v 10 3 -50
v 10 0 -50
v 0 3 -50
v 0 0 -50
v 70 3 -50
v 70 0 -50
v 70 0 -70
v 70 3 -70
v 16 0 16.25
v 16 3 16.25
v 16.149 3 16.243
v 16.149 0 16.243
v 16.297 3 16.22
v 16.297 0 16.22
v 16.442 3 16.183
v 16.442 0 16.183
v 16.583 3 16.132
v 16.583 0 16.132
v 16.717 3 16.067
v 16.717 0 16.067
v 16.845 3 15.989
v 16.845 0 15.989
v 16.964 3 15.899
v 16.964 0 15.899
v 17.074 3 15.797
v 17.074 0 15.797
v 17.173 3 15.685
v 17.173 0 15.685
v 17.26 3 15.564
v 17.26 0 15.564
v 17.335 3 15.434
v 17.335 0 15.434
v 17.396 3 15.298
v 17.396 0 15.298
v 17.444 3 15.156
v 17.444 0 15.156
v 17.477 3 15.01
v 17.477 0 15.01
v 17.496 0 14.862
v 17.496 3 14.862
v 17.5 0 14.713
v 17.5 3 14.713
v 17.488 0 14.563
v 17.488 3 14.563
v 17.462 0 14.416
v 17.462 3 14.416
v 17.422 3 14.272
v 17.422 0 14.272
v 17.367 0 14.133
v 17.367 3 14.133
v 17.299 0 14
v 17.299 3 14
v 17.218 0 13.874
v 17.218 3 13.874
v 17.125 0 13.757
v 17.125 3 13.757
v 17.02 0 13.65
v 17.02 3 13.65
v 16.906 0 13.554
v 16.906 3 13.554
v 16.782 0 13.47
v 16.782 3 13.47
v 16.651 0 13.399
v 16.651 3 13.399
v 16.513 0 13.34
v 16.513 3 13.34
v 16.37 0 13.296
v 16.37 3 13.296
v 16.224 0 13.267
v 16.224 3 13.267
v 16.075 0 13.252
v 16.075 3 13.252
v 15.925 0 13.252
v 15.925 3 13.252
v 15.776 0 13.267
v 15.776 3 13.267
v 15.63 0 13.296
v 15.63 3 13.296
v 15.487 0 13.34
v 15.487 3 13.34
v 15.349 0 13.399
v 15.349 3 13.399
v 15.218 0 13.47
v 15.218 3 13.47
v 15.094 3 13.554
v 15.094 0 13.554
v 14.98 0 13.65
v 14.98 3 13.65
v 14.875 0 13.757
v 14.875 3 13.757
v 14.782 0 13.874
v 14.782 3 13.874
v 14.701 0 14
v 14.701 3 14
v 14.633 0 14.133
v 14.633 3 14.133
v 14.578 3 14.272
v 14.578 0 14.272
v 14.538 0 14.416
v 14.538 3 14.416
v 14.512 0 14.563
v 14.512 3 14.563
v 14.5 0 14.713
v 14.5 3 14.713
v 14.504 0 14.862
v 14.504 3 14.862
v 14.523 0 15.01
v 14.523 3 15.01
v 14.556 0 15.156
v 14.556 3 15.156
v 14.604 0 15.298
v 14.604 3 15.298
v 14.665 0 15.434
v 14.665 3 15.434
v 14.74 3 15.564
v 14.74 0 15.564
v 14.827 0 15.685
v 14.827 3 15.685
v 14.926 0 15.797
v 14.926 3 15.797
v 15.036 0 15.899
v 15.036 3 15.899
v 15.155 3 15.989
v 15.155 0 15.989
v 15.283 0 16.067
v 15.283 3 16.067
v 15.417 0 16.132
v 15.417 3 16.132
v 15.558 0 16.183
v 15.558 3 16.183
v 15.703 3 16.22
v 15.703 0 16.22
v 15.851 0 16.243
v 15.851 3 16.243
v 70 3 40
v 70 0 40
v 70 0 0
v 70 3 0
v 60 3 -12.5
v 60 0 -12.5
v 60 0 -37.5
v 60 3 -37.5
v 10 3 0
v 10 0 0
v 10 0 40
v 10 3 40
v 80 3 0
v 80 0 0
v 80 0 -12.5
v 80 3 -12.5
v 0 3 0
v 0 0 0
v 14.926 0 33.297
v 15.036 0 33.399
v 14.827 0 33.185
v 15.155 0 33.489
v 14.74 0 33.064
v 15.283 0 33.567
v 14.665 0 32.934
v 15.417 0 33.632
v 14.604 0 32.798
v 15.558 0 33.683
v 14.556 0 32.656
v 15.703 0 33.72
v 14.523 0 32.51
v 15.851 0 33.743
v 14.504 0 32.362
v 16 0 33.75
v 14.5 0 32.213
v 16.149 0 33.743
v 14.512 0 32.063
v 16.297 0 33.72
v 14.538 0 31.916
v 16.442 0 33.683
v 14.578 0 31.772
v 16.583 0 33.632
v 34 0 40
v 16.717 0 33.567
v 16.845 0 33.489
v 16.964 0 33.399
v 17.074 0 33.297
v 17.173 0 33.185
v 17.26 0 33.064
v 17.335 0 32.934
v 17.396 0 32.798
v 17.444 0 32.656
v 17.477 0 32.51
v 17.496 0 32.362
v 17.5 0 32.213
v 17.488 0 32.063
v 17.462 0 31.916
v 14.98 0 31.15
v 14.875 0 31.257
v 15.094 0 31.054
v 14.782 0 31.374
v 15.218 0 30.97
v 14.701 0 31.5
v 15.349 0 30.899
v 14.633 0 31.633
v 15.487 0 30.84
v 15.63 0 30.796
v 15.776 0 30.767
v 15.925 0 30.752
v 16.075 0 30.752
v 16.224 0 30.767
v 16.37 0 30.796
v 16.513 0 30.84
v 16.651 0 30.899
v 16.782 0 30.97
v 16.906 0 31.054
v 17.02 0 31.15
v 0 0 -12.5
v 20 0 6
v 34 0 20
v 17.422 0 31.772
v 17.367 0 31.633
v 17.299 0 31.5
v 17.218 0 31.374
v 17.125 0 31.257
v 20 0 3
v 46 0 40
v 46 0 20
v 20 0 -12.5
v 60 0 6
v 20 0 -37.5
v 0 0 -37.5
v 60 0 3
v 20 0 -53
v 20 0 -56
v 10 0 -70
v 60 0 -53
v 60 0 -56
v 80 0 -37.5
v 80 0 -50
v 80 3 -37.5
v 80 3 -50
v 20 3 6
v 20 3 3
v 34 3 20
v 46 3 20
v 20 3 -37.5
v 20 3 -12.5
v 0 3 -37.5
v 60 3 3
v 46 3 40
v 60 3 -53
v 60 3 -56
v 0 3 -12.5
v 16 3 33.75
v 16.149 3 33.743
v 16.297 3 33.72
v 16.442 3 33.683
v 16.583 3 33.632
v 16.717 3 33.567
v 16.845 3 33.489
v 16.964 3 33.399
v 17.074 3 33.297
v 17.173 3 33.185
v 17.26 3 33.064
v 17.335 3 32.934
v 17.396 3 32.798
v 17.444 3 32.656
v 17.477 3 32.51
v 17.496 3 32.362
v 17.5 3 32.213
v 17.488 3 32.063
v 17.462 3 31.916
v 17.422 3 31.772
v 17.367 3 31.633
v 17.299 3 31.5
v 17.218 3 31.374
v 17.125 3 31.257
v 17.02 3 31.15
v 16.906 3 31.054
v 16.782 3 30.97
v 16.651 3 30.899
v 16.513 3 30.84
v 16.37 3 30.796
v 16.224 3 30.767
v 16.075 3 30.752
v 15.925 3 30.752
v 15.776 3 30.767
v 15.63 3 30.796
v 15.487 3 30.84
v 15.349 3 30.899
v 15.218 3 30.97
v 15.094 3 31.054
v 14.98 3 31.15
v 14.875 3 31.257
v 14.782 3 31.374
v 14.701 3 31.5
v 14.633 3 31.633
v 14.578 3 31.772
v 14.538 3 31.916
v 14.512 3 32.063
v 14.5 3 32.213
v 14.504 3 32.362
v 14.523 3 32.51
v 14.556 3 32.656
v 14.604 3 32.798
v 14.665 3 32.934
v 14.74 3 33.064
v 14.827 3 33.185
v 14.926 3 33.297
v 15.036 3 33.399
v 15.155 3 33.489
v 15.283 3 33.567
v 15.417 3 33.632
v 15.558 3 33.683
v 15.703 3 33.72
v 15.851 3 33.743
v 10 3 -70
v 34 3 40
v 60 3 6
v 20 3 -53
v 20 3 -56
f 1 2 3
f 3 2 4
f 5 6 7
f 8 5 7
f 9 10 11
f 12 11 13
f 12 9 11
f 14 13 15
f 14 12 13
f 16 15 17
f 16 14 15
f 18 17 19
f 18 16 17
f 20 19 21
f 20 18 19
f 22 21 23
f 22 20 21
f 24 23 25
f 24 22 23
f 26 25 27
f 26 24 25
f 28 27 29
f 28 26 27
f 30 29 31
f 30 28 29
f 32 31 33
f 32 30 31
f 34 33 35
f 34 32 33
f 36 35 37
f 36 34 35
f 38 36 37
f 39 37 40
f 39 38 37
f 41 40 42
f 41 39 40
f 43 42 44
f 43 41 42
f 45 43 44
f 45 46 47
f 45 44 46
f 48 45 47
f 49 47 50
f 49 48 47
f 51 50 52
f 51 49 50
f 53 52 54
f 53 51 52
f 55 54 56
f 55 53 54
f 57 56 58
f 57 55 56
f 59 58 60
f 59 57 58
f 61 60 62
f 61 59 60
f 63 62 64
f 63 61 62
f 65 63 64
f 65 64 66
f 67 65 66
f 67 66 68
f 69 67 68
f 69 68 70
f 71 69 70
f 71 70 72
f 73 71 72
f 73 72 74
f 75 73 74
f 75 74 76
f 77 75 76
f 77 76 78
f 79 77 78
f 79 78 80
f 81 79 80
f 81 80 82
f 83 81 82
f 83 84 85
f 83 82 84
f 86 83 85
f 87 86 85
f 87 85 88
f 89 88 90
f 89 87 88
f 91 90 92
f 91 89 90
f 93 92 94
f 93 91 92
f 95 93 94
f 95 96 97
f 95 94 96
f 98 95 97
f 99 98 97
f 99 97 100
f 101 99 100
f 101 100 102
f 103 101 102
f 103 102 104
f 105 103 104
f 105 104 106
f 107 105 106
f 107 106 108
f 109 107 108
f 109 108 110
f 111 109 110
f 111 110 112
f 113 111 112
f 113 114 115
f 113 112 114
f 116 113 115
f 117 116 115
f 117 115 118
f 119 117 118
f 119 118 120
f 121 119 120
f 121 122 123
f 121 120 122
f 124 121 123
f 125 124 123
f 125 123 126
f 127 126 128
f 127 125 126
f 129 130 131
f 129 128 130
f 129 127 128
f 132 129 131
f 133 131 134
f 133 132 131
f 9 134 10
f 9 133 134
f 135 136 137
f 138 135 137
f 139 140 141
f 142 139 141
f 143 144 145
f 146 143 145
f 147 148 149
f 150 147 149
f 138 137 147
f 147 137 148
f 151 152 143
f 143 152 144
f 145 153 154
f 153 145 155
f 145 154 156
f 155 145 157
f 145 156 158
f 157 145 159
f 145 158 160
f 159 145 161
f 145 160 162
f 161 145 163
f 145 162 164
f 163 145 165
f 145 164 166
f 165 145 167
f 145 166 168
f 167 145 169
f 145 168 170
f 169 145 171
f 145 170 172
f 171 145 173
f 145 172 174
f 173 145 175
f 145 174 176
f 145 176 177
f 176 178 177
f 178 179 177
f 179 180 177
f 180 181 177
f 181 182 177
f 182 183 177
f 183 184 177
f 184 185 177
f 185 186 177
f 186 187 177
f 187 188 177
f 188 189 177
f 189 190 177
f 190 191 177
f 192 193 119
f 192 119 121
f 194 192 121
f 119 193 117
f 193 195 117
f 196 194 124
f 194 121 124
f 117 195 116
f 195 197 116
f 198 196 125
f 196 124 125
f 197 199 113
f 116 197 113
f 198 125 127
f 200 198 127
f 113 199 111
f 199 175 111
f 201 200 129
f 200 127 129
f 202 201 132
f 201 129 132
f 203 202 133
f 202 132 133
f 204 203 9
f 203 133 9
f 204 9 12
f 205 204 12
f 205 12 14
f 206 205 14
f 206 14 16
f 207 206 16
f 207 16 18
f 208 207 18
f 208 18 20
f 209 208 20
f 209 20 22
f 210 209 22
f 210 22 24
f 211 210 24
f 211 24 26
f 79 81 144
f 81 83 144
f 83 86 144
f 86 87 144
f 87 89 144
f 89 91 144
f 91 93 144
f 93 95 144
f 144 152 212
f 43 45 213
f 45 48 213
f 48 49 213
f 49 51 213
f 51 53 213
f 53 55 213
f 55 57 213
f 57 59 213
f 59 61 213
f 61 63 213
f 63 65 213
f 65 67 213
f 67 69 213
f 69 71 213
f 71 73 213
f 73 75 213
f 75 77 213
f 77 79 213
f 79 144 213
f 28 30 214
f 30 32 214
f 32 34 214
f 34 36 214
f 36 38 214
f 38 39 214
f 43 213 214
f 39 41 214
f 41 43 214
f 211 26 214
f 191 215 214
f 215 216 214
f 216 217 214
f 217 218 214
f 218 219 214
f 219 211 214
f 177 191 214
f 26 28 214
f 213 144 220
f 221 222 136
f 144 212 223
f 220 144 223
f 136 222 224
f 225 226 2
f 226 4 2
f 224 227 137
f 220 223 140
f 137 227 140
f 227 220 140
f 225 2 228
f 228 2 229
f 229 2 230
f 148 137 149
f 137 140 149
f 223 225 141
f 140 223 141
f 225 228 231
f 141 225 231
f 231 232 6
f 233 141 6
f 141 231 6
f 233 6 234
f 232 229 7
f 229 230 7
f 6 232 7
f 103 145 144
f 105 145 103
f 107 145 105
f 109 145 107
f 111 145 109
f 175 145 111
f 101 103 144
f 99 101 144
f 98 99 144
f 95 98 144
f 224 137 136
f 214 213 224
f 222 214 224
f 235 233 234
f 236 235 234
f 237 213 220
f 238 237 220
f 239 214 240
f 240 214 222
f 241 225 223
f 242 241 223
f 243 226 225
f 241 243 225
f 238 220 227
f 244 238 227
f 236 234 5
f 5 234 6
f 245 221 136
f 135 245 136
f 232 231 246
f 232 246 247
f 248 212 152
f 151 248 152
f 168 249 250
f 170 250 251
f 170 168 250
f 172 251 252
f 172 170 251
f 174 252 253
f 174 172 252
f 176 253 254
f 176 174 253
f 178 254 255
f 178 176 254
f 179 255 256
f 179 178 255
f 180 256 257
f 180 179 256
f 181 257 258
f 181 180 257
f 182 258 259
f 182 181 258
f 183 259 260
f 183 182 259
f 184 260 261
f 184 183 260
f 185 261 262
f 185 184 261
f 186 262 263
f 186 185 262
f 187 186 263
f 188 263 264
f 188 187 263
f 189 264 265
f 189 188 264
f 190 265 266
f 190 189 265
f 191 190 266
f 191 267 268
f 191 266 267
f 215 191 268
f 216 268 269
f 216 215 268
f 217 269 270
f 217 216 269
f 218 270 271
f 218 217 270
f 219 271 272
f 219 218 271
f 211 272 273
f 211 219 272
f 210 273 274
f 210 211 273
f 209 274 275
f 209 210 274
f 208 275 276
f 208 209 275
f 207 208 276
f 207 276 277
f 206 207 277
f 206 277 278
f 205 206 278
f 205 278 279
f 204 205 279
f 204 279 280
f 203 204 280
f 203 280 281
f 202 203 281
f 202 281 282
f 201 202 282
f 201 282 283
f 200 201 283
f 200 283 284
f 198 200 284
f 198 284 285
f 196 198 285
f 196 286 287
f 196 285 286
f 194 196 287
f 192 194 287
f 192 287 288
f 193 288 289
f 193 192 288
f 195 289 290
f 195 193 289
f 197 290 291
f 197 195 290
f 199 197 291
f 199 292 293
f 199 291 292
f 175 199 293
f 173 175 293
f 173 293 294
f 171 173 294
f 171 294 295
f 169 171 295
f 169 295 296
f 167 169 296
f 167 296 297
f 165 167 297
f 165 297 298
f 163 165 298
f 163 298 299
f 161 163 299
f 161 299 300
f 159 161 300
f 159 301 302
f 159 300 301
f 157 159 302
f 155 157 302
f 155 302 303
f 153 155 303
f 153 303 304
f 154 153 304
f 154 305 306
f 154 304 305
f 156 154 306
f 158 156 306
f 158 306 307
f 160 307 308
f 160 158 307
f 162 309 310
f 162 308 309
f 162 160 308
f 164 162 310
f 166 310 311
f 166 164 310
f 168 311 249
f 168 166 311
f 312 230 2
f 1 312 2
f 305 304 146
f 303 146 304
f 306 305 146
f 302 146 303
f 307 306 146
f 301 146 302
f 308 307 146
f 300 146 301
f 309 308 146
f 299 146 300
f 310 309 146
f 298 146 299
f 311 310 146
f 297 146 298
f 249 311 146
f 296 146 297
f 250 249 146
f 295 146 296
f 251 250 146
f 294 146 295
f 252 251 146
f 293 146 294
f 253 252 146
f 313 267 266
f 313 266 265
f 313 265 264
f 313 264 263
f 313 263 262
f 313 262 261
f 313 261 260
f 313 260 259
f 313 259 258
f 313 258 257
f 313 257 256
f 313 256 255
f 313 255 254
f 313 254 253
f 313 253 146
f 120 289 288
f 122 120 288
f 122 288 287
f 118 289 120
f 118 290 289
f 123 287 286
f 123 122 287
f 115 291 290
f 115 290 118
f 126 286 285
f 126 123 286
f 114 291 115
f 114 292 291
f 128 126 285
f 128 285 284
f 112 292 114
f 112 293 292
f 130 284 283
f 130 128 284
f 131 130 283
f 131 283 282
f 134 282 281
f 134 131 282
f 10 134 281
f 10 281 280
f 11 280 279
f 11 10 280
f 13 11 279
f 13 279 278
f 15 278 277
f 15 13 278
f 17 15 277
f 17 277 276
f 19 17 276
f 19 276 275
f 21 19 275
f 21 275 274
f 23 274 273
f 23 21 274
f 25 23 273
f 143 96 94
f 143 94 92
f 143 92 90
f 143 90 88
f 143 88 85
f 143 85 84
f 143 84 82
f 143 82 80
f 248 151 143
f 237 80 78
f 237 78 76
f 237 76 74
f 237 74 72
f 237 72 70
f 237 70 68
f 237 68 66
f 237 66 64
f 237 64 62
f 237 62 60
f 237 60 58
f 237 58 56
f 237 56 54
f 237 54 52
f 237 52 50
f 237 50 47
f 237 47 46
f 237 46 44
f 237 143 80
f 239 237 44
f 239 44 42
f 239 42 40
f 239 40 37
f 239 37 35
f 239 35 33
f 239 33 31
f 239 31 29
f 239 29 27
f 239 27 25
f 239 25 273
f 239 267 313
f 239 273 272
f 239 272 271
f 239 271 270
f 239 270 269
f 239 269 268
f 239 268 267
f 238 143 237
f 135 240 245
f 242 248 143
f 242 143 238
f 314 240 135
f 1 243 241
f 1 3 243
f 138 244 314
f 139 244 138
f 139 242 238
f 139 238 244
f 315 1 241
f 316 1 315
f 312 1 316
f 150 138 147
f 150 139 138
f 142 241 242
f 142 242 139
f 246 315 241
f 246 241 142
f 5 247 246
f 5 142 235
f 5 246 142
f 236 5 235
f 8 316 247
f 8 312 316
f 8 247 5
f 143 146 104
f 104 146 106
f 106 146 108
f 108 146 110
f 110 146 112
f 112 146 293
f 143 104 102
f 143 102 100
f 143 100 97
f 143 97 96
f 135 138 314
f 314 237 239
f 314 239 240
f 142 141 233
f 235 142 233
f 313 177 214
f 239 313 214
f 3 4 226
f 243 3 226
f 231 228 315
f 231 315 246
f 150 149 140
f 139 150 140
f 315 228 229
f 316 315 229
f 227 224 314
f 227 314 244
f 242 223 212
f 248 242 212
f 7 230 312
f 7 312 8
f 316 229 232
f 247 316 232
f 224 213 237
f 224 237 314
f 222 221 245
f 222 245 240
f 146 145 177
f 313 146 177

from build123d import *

# Parameters (mm, degrees)
SKETCH1_W           = 40
SKETCH1_H           = 3
BOSS_EXTRUDE1_DEPTH = 3
SKETCH3_R           = 1.5
SKETCH3_W           = 12
SKETCH3_H           = 20
SKETCH3_W_2         = 60
CUT_EXTRUDE2_DEPTH  = 10


with BuildPart() as part:
    # Sketch1 → Boss-Extrude1 (new body)
    with BuildSketch(Plane(origin=(0, 0, 0), x_dir=(1, 0, 0), z_dir=(0, 1, 0))):
        Polygon((20, 37.5), (20, 12.5), (0, 12.5), (0, 0), (10, 0), (10, -40), (70, -40), (70, 0), (80, 0), (80, 12.5), (60, 12.5), (60, 37.5), (80, 37.5), (80, 50), (70, 50), (70, 90), (10, 90), (10, 50), (0, 50), (0, 37.5), align=None)
        with Locations((40, -4.5)):
            Rectangle(SKETCH1_W, SKETCH1_H, mode=Mode.SUBTRACT)
        with Locations((40, 54.5)):
            Rectangle(SKETCH1_W, SKETCH1_H, mode=Mode.SUBTRACT)
    extrude(amount=BOSS_EXTRUDE1_DEPTH)

    # Sketch3 → Cut-Extrude2 (cut)
    with BuildSketch(Plane(origin=(0, 0, 0), x_dir=(1, 0, 0), z_dir=(0, 1, 0))):
        with Locations(Location((16, -32.25, 0), (0, 0, 270))):
            Circle(SKETCH3_R)
        with Locations(Location((16, -14.75, 0), (0, 0, 270))):
            Circle(SKETCH3_R)
        with Locations((40, -30)):
            Rectangle(SKETCH3_W, SKETCH3_H)
        with Locations((40, 80)):
            Rectangle(SKETCH3_W_2, SKETCH3_H)
    extrude(amount=CUT_EXTRUDE2_DEPTH, mode=Mode.SUBTRACT)


solid = part.part
